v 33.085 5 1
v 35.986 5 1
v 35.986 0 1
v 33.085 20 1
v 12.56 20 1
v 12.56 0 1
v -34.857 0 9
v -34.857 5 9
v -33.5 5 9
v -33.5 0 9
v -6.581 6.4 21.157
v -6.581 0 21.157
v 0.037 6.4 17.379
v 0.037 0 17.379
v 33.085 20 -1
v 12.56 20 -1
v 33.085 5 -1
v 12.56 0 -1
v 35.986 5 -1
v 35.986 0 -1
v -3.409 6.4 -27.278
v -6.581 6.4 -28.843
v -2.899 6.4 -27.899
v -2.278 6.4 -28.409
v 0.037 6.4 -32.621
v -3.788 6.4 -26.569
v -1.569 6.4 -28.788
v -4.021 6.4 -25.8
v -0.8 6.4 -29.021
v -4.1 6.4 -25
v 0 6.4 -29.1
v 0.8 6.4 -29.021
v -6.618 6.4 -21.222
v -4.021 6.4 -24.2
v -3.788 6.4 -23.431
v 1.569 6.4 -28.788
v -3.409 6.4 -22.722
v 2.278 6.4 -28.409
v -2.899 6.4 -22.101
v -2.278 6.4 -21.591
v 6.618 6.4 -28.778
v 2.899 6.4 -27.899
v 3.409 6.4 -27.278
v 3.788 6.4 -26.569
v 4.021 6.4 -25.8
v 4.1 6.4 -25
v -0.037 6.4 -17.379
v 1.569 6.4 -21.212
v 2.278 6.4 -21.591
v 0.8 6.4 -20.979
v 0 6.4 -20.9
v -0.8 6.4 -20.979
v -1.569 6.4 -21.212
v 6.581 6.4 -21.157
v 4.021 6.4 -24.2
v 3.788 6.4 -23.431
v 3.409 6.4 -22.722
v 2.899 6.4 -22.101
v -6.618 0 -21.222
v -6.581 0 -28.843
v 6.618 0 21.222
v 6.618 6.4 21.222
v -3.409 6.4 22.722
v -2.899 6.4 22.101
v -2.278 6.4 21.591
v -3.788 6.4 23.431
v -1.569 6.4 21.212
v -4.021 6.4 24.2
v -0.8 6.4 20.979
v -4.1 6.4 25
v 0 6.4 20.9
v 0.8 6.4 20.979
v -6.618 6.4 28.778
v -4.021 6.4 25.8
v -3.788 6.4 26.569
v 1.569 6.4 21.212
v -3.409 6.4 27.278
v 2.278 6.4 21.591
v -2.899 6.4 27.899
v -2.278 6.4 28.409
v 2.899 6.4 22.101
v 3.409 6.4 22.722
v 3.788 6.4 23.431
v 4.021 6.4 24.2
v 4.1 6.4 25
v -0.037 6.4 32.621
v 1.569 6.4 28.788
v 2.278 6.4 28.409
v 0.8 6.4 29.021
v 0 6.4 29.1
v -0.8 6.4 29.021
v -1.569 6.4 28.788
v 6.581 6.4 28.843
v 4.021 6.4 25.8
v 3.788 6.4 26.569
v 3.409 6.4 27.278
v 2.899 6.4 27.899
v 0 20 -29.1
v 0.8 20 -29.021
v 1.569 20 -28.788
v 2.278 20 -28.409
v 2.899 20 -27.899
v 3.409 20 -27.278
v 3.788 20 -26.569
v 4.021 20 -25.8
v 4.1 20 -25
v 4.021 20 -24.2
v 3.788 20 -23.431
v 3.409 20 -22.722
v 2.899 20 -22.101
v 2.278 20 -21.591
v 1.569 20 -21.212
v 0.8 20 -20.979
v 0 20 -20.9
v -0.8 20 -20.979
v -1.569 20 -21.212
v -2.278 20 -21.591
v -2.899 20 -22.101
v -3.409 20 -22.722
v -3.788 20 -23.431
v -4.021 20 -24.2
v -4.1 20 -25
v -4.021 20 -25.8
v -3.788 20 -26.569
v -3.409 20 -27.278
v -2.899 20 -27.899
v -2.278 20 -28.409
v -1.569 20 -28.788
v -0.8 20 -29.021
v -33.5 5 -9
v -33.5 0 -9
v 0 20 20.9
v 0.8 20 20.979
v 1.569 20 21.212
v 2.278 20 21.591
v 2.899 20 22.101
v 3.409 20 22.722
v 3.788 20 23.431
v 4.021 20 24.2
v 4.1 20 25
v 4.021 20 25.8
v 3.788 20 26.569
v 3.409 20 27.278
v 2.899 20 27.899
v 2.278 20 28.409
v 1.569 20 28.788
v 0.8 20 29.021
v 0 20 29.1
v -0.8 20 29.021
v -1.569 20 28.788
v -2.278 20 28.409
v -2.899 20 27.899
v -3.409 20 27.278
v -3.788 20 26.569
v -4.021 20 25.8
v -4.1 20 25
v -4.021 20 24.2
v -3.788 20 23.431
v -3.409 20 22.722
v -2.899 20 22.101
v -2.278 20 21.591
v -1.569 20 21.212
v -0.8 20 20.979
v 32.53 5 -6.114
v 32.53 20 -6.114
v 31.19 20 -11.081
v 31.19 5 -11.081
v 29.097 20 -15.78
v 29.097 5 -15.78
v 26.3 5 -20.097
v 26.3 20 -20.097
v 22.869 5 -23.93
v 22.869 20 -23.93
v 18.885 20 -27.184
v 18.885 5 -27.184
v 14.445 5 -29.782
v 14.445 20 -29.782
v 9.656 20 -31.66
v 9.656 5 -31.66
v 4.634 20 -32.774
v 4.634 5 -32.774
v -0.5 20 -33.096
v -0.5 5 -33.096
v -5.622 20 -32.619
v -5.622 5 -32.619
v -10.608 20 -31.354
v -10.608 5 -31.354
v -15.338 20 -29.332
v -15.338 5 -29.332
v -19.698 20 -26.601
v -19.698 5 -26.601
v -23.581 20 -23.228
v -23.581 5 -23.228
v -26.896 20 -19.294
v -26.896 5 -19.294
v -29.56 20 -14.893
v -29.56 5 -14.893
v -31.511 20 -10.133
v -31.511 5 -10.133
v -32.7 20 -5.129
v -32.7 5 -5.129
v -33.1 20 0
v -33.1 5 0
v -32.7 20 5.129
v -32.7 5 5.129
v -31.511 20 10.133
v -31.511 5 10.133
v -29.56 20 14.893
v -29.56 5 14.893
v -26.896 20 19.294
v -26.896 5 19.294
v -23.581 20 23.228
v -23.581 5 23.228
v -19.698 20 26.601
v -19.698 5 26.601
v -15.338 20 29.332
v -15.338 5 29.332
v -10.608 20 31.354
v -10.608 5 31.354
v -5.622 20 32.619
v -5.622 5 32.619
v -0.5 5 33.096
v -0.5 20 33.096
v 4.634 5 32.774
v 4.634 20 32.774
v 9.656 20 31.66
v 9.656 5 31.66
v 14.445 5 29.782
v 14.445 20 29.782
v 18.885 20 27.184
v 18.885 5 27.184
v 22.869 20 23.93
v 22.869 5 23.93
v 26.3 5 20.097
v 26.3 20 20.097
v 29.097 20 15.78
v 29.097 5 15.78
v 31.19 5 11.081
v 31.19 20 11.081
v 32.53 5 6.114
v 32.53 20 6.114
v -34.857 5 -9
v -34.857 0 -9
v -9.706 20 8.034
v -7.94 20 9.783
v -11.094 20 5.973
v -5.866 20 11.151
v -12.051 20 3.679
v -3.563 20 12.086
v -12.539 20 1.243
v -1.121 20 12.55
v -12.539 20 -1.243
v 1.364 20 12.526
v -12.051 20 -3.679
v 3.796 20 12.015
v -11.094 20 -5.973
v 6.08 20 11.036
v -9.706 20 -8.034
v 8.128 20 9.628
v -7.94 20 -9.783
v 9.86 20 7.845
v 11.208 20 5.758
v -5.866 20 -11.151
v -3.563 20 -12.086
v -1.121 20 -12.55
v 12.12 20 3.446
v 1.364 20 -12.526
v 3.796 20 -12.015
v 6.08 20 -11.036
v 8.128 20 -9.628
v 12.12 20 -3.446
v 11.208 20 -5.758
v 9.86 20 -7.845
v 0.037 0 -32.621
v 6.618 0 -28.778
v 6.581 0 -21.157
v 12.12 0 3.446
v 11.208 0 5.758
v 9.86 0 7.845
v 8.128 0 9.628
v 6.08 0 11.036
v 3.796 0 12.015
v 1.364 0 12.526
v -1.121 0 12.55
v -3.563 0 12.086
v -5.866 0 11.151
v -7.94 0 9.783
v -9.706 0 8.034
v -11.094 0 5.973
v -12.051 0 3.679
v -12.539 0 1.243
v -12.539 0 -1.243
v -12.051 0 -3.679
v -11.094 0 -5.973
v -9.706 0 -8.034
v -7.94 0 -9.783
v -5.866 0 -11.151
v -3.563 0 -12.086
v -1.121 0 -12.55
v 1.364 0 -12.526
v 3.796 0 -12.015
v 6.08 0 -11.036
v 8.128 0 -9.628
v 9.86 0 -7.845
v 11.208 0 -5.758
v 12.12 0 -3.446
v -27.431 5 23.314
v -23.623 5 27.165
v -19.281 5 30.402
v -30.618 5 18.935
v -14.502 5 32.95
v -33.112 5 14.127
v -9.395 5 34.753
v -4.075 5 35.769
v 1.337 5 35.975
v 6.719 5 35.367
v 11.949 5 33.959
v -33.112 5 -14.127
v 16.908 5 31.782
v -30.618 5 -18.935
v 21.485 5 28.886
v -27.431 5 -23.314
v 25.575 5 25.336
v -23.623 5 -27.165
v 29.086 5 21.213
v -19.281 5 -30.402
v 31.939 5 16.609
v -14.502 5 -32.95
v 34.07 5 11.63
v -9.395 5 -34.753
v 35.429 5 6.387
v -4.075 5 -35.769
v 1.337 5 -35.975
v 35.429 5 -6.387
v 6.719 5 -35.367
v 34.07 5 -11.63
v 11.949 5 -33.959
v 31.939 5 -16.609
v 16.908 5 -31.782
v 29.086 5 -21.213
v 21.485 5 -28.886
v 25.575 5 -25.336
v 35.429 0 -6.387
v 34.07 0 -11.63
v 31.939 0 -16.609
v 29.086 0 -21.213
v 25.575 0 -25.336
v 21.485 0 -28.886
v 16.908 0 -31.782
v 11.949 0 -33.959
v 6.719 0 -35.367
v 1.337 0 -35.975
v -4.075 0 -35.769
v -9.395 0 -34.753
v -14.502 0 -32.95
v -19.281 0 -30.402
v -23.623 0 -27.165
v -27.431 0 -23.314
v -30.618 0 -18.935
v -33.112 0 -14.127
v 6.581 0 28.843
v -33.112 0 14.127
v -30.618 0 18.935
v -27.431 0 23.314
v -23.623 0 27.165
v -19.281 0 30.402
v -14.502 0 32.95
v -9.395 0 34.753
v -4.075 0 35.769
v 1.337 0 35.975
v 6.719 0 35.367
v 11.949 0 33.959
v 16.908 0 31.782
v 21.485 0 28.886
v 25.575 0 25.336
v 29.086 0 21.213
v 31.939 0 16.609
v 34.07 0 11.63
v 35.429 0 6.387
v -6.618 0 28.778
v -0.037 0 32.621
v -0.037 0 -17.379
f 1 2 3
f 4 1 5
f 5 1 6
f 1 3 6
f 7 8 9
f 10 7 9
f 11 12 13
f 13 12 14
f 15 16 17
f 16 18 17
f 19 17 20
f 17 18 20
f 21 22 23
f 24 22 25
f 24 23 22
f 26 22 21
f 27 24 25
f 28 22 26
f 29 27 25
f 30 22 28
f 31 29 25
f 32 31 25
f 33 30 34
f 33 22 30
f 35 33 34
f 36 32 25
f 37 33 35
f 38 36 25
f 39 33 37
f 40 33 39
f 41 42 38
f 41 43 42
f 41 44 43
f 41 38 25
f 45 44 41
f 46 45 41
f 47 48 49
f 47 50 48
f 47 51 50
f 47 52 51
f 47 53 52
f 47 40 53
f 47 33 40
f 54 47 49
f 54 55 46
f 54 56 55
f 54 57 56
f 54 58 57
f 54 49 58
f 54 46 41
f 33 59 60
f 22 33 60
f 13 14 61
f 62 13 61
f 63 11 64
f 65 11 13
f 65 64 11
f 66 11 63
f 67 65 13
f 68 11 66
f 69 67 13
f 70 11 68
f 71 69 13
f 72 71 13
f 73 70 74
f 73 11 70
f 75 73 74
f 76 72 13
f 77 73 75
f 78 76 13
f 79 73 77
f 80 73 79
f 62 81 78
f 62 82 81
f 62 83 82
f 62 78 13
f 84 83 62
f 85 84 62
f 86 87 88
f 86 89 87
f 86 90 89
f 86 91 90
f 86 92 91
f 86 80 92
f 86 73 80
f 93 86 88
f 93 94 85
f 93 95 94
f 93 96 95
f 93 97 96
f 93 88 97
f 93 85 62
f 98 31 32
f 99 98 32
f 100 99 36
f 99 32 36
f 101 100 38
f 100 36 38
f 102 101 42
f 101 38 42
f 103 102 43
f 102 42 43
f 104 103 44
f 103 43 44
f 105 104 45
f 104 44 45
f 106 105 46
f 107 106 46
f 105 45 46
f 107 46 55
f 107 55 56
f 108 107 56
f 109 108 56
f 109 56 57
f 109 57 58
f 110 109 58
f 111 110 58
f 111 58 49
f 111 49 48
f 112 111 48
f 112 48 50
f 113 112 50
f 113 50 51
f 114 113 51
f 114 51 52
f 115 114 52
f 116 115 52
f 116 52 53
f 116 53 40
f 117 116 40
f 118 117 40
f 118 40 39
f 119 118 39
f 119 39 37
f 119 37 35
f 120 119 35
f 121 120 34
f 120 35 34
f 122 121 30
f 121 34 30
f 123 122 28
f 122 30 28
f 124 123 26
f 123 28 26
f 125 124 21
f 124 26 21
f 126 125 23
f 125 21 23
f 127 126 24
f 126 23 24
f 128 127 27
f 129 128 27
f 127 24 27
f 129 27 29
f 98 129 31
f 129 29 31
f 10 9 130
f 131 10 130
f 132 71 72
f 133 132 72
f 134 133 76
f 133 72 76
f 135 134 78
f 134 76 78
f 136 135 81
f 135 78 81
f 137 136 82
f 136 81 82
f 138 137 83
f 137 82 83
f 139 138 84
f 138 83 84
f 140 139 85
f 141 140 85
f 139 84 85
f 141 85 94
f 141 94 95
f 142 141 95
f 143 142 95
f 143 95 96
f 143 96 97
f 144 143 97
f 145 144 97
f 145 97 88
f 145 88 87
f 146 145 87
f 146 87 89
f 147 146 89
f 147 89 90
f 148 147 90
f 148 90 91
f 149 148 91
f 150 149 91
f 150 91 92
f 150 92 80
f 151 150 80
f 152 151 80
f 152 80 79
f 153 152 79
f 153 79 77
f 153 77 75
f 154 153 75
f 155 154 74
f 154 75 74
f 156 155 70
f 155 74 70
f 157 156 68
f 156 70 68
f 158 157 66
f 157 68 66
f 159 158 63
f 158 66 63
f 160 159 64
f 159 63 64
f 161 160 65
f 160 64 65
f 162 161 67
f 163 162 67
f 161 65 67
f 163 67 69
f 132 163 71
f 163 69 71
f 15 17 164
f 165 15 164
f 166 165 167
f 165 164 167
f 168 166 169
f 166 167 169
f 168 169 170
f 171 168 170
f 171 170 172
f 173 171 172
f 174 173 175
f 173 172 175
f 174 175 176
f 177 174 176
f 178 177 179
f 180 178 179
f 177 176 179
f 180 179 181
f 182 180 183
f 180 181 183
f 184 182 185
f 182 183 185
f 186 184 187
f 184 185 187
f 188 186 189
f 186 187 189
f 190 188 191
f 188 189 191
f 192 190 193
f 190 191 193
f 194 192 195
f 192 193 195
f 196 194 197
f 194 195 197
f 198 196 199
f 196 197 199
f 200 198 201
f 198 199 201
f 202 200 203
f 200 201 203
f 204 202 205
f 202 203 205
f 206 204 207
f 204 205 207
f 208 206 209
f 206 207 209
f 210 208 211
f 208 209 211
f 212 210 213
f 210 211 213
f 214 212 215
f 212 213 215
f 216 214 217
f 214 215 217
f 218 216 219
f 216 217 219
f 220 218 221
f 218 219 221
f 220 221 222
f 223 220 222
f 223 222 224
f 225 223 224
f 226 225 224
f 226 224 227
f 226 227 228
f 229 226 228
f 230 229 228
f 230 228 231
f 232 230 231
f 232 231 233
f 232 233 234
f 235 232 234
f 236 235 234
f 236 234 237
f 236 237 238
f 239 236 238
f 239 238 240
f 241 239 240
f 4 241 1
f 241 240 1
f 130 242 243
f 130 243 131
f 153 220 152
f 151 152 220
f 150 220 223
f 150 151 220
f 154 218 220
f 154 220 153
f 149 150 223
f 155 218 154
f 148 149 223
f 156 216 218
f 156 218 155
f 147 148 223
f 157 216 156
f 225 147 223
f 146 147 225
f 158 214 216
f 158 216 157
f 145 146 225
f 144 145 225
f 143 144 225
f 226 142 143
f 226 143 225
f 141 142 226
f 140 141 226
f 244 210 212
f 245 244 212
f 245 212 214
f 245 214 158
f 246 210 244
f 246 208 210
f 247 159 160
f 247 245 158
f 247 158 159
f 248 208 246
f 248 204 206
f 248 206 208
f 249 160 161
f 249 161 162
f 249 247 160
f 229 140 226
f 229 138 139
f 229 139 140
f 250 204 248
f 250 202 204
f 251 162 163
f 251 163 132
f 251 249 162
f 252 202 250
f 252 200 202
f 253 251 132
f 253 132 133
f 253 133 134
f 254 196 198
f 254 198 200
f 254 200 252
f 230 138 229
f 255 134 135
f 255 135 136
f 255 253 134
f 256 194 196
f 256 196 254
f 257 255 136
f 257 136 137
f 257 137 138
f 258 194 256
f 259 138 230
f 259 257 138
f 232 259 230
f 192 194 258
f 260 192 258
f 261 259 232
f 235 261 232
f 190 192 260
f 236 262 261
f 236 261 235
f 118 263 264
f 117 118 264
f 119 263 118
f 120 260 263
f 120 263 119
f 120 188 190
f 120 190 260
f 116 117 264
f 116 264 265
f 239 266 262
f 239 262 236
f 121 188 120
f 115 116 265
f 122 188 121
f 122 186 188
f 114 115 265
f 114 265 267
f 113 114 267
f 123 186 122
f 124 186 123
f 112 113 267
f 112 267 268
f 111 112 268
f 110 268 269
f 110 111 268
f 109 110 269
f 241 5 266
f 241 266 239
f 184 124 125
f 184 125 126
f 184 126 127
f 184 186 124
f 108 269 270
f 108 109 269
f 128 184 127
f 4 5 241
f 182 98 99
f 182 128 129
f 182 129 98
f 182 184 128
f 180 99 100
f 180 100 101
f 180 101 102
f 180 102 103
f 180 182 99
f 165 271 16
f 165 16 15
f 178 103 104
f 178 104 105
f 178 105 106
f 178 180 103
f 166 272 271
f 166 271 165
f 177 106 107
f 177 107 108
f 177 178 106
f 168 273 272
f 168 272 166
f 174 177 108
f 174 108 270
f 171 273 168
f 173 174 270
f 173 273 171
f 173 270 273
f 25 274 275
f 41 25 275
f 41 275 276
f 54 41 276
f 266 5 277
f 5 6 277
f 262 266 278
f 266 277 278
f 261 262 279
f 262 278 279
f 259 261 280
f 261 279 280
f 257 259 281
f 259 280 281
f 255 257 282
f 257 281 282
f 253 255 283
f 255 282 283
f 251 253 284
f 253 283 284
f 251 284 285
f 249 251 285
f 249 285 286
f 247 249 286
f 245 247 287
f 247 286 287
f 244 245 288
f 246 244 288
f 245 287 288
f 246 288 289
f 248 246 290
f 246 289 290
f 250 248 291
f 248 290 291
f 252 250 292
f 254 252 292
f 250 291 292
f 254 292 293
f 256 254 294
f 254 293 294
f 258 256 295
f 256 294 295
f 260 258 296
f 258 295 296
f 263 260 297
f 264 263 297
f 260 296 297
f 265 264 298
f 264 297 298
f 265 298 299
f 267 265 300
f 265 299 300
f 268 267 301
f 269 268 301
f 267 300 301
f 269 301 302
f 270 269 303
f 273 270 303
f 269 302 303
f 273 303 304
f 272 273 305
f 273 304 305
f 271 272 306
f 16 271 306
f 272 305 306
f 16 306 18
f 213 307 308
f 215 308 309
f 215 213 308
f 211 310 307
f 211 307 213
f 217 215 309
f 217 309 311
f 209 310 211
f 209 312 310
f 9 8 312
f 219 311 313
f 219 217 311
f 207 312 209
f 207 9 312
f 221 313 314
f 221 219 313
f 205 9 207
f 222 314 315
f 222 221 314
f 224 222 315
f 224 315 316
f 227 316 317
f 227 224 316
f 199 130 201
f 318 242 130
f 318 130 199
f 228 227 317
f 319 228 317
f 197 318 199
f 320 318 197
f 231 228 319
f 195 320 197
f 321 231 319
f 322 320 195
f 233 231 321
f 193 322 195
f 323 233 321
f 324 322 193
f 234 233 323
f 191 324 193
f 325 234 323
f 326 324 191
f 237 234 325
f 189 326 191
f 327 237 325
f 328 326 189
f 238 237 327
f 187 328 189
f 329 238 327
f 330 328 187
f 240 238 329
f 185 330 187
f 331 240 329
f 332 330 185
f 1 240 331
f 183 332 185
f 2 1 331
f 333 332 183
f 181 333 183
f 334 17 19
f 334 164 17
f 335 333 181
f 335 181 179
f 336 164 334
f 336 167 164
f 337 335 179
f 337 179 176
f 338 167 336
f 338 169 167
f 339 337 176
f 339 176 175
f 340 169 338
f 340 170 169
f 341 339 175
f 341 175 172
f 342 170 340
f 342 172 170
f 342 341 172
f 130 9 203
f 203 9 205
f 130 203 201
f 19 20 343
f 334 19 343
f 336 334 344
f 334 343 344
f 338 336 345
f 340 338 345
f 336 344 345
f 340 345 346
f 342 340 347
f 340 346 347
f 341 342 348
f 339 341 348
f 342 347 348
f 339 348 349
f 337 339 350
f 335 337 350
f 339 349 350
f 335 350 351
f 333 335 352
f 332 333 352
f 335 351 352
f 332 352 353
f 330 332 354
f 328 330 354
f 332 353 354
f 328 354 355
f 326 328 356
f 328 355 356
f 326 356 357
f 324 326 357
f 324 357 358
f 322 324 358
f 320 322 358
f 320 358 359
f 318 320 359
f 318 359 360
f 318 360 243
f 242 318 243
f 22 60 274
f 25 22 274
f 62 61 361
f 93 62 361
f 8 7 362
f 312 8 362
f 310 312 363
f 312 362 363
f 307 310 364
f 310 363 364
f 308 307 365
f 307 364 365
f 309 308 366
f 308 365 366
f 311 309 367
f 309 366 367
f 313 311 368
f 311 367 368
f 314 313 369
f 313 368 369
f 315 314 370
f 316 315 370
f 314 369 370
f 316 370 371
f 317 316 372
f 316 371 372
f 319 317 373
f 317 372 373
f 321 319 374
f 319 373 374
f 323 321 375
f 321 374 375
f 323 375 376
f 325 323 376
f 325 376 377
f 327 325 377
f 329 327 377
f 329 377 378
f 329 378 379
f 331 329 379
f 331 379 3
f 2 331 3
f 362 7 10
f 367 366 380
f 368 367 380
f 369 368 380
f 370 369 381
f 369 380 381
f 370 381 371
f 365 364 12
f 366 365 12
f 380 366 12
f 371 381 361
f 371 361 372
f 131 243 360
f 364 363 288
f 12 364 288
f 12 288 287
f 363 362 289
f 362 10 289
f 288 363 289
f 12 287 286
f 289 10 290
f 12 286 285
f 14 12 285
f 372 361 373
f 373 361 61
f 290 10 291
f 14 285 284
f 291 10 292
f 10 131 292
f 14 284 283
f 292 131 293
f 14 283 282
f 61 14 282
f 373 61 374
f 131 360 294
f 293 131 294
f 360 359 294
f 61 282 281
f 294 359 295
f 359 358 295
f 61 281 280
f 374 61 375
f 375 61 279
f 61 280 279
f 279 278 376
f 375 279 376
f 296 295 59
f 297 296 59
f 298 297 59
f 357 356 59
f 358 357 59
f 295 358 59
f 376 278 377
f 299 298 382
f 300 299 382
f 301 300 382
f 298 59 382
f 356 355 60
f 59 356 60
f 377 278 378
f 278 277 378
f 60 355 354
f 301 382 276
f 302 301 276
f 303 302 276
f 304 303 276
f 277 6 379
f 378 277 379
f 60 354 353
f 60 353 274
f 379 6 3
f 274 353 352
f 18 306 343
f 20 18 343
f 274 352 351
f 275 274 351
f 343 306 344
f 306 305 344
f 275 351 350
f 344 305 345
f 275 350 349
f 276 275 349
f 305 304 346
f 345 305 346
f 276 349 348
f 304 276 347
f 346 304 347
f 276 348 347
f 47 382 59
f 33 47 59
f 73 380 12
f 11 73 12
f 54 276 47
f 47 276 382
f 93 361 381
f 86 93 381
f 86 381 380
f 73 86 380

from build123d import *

# Parameters (mm, degrees)
BOSS_EXTRUDE1_DEPTH = 5
BOSS_EXTRUDE2_DEPTH = 15
CUT_EXTRUDE1_REACH  = 56.699
SKETCH3_R           = 4.1
CUT_EXTRUDE2_DEPTH  = 6.4
SKETCH9_W           = 13
SKETCH9_H           = 18
CUT_EXTRUDE3_DEPTH  = 55.699177325


# Read off the part's stored shape, not the designer's step: Boss-Extrude2
with BuildPart() as part:
    # Sketch1 → Boss-Extrude1 (new body)
    with BuildSketch(Plane(origin=(0, 0, 0), x_dir=(1, 0, 0), z_dir=(0, 1, 0))):
        with BuildLine():
            Line((35.986108431, -1), (12.560254774, -1))
            ThreePointArc((12.560254774, -1), (-12.6, 0), (12.560254774, 1))
            Line((12.560254774, 1), (35.986108431, 1))
            ThreePointArc((35.986108431, 1), (-36, 0), (35.986108431, -1))
        make_face()
    extrude(amount=BOSS_EXTRUDE1_DEPTH)

    # Boss-Extrude2 outline → Boss-Extrude2 (add)
    with BuildSketch(Plane(origin=(0, 5, 0), x_dir=(1, 0, 0), z_dir=(0, 1, 0))):
        with BuildLine():
            Line((33.084890811, -1), (12.560254774, -1))
            ThreePointArc((12.560254774, -1), (-12.6, 0), (12.560254774, 1))
            Line((12.560254774, 1), (33.084890811, 1))
            ThreePointArc((33.084890811, 1), (-33.1, 0), (33.084890811, -1))
        make_face()
    extrude(amount=BOSS_EXTRUDE2_DEPTH)

    # Sketch3 → Cut-Extrude1 (cut, up to next)
    with BuildSketch(Plane.XZ, mode=Mode.PRIVATE) as cut_extrude1_sk1:
        with Locations(Location((0, 25, 0), (0, 0, 270))):
            Circle(SKETCH3_R)
    cut_extrude1_tool1 = extrude(cut_extrude1_sk1.sketch, amount=-CUT_EXTRUDE1_REACH, mode=Mode.PRIVATE) & part.part
    # Sketch3 → Cut-Extrude1 (cut, up to next)
    with BuildSketch(Plane.XZ, mode=Mode.PRIVATE) as cut_extrude1_sk2:
        with Locations(Location((0, -25, 0), (0, 0, 270))):
            Circle(SKETCH3_R)
    cut_extrude1_tool2 = extrude(cut_extrude1_sk2.sketch, amount=-CUT_EXTRUDE1_REACH, mode=Mode.PRIVATE) & part.part
    add(cut_extrude1_tool1.solids().sort_by_distance((0, 0, 25))[0], mode=Mode.SUBTRACT)
    add(cut_extrude1_tool2.solids().sort_by_distance((0, 0, -25))[0], mode=Mode.SUBTRACT)

    # Sketch8 → Cut-Extrude2 (cut)
    with BuildSketch(Plane.XZ):
        Polygon((6.618426782, 21.22158407), (6.581417572, 28.842517761), (-0.03700921, 32.620933691), (-6.618426782, 28.77841593), (-6.581417572, 21.157482239), (0.03700921, 17.379066309), align=None)
        Polygon((6.618426782, -28.77841593), (6.581417572, -21.157482239), (-0.03700921, -17.379066309), (-6.618426782, -21.22158407), (-6.581417572, -28.842517761), (0.03700921, -32.620933691), align=None)
    extrude(amount=-CUT_EXTRUDE2_DEPTH, mode=Mode.SUBTRACT)

    # Sketch9 → Cut-Extrude3 (cut, through all)
    with BuildSketch(Plane(origin=(0, 20, 0), x_dir=(1, 0, 0), z_dir=(0, 1, 0))):
        with Locations((-40, 0)):
            Rectangle(SKETCH9_W, SKETCH9_H)
    extrude(amount=-CUT_EXTRUDE3_DEPTH, mode=Mode.SUBTRACT)


solid = part.part
